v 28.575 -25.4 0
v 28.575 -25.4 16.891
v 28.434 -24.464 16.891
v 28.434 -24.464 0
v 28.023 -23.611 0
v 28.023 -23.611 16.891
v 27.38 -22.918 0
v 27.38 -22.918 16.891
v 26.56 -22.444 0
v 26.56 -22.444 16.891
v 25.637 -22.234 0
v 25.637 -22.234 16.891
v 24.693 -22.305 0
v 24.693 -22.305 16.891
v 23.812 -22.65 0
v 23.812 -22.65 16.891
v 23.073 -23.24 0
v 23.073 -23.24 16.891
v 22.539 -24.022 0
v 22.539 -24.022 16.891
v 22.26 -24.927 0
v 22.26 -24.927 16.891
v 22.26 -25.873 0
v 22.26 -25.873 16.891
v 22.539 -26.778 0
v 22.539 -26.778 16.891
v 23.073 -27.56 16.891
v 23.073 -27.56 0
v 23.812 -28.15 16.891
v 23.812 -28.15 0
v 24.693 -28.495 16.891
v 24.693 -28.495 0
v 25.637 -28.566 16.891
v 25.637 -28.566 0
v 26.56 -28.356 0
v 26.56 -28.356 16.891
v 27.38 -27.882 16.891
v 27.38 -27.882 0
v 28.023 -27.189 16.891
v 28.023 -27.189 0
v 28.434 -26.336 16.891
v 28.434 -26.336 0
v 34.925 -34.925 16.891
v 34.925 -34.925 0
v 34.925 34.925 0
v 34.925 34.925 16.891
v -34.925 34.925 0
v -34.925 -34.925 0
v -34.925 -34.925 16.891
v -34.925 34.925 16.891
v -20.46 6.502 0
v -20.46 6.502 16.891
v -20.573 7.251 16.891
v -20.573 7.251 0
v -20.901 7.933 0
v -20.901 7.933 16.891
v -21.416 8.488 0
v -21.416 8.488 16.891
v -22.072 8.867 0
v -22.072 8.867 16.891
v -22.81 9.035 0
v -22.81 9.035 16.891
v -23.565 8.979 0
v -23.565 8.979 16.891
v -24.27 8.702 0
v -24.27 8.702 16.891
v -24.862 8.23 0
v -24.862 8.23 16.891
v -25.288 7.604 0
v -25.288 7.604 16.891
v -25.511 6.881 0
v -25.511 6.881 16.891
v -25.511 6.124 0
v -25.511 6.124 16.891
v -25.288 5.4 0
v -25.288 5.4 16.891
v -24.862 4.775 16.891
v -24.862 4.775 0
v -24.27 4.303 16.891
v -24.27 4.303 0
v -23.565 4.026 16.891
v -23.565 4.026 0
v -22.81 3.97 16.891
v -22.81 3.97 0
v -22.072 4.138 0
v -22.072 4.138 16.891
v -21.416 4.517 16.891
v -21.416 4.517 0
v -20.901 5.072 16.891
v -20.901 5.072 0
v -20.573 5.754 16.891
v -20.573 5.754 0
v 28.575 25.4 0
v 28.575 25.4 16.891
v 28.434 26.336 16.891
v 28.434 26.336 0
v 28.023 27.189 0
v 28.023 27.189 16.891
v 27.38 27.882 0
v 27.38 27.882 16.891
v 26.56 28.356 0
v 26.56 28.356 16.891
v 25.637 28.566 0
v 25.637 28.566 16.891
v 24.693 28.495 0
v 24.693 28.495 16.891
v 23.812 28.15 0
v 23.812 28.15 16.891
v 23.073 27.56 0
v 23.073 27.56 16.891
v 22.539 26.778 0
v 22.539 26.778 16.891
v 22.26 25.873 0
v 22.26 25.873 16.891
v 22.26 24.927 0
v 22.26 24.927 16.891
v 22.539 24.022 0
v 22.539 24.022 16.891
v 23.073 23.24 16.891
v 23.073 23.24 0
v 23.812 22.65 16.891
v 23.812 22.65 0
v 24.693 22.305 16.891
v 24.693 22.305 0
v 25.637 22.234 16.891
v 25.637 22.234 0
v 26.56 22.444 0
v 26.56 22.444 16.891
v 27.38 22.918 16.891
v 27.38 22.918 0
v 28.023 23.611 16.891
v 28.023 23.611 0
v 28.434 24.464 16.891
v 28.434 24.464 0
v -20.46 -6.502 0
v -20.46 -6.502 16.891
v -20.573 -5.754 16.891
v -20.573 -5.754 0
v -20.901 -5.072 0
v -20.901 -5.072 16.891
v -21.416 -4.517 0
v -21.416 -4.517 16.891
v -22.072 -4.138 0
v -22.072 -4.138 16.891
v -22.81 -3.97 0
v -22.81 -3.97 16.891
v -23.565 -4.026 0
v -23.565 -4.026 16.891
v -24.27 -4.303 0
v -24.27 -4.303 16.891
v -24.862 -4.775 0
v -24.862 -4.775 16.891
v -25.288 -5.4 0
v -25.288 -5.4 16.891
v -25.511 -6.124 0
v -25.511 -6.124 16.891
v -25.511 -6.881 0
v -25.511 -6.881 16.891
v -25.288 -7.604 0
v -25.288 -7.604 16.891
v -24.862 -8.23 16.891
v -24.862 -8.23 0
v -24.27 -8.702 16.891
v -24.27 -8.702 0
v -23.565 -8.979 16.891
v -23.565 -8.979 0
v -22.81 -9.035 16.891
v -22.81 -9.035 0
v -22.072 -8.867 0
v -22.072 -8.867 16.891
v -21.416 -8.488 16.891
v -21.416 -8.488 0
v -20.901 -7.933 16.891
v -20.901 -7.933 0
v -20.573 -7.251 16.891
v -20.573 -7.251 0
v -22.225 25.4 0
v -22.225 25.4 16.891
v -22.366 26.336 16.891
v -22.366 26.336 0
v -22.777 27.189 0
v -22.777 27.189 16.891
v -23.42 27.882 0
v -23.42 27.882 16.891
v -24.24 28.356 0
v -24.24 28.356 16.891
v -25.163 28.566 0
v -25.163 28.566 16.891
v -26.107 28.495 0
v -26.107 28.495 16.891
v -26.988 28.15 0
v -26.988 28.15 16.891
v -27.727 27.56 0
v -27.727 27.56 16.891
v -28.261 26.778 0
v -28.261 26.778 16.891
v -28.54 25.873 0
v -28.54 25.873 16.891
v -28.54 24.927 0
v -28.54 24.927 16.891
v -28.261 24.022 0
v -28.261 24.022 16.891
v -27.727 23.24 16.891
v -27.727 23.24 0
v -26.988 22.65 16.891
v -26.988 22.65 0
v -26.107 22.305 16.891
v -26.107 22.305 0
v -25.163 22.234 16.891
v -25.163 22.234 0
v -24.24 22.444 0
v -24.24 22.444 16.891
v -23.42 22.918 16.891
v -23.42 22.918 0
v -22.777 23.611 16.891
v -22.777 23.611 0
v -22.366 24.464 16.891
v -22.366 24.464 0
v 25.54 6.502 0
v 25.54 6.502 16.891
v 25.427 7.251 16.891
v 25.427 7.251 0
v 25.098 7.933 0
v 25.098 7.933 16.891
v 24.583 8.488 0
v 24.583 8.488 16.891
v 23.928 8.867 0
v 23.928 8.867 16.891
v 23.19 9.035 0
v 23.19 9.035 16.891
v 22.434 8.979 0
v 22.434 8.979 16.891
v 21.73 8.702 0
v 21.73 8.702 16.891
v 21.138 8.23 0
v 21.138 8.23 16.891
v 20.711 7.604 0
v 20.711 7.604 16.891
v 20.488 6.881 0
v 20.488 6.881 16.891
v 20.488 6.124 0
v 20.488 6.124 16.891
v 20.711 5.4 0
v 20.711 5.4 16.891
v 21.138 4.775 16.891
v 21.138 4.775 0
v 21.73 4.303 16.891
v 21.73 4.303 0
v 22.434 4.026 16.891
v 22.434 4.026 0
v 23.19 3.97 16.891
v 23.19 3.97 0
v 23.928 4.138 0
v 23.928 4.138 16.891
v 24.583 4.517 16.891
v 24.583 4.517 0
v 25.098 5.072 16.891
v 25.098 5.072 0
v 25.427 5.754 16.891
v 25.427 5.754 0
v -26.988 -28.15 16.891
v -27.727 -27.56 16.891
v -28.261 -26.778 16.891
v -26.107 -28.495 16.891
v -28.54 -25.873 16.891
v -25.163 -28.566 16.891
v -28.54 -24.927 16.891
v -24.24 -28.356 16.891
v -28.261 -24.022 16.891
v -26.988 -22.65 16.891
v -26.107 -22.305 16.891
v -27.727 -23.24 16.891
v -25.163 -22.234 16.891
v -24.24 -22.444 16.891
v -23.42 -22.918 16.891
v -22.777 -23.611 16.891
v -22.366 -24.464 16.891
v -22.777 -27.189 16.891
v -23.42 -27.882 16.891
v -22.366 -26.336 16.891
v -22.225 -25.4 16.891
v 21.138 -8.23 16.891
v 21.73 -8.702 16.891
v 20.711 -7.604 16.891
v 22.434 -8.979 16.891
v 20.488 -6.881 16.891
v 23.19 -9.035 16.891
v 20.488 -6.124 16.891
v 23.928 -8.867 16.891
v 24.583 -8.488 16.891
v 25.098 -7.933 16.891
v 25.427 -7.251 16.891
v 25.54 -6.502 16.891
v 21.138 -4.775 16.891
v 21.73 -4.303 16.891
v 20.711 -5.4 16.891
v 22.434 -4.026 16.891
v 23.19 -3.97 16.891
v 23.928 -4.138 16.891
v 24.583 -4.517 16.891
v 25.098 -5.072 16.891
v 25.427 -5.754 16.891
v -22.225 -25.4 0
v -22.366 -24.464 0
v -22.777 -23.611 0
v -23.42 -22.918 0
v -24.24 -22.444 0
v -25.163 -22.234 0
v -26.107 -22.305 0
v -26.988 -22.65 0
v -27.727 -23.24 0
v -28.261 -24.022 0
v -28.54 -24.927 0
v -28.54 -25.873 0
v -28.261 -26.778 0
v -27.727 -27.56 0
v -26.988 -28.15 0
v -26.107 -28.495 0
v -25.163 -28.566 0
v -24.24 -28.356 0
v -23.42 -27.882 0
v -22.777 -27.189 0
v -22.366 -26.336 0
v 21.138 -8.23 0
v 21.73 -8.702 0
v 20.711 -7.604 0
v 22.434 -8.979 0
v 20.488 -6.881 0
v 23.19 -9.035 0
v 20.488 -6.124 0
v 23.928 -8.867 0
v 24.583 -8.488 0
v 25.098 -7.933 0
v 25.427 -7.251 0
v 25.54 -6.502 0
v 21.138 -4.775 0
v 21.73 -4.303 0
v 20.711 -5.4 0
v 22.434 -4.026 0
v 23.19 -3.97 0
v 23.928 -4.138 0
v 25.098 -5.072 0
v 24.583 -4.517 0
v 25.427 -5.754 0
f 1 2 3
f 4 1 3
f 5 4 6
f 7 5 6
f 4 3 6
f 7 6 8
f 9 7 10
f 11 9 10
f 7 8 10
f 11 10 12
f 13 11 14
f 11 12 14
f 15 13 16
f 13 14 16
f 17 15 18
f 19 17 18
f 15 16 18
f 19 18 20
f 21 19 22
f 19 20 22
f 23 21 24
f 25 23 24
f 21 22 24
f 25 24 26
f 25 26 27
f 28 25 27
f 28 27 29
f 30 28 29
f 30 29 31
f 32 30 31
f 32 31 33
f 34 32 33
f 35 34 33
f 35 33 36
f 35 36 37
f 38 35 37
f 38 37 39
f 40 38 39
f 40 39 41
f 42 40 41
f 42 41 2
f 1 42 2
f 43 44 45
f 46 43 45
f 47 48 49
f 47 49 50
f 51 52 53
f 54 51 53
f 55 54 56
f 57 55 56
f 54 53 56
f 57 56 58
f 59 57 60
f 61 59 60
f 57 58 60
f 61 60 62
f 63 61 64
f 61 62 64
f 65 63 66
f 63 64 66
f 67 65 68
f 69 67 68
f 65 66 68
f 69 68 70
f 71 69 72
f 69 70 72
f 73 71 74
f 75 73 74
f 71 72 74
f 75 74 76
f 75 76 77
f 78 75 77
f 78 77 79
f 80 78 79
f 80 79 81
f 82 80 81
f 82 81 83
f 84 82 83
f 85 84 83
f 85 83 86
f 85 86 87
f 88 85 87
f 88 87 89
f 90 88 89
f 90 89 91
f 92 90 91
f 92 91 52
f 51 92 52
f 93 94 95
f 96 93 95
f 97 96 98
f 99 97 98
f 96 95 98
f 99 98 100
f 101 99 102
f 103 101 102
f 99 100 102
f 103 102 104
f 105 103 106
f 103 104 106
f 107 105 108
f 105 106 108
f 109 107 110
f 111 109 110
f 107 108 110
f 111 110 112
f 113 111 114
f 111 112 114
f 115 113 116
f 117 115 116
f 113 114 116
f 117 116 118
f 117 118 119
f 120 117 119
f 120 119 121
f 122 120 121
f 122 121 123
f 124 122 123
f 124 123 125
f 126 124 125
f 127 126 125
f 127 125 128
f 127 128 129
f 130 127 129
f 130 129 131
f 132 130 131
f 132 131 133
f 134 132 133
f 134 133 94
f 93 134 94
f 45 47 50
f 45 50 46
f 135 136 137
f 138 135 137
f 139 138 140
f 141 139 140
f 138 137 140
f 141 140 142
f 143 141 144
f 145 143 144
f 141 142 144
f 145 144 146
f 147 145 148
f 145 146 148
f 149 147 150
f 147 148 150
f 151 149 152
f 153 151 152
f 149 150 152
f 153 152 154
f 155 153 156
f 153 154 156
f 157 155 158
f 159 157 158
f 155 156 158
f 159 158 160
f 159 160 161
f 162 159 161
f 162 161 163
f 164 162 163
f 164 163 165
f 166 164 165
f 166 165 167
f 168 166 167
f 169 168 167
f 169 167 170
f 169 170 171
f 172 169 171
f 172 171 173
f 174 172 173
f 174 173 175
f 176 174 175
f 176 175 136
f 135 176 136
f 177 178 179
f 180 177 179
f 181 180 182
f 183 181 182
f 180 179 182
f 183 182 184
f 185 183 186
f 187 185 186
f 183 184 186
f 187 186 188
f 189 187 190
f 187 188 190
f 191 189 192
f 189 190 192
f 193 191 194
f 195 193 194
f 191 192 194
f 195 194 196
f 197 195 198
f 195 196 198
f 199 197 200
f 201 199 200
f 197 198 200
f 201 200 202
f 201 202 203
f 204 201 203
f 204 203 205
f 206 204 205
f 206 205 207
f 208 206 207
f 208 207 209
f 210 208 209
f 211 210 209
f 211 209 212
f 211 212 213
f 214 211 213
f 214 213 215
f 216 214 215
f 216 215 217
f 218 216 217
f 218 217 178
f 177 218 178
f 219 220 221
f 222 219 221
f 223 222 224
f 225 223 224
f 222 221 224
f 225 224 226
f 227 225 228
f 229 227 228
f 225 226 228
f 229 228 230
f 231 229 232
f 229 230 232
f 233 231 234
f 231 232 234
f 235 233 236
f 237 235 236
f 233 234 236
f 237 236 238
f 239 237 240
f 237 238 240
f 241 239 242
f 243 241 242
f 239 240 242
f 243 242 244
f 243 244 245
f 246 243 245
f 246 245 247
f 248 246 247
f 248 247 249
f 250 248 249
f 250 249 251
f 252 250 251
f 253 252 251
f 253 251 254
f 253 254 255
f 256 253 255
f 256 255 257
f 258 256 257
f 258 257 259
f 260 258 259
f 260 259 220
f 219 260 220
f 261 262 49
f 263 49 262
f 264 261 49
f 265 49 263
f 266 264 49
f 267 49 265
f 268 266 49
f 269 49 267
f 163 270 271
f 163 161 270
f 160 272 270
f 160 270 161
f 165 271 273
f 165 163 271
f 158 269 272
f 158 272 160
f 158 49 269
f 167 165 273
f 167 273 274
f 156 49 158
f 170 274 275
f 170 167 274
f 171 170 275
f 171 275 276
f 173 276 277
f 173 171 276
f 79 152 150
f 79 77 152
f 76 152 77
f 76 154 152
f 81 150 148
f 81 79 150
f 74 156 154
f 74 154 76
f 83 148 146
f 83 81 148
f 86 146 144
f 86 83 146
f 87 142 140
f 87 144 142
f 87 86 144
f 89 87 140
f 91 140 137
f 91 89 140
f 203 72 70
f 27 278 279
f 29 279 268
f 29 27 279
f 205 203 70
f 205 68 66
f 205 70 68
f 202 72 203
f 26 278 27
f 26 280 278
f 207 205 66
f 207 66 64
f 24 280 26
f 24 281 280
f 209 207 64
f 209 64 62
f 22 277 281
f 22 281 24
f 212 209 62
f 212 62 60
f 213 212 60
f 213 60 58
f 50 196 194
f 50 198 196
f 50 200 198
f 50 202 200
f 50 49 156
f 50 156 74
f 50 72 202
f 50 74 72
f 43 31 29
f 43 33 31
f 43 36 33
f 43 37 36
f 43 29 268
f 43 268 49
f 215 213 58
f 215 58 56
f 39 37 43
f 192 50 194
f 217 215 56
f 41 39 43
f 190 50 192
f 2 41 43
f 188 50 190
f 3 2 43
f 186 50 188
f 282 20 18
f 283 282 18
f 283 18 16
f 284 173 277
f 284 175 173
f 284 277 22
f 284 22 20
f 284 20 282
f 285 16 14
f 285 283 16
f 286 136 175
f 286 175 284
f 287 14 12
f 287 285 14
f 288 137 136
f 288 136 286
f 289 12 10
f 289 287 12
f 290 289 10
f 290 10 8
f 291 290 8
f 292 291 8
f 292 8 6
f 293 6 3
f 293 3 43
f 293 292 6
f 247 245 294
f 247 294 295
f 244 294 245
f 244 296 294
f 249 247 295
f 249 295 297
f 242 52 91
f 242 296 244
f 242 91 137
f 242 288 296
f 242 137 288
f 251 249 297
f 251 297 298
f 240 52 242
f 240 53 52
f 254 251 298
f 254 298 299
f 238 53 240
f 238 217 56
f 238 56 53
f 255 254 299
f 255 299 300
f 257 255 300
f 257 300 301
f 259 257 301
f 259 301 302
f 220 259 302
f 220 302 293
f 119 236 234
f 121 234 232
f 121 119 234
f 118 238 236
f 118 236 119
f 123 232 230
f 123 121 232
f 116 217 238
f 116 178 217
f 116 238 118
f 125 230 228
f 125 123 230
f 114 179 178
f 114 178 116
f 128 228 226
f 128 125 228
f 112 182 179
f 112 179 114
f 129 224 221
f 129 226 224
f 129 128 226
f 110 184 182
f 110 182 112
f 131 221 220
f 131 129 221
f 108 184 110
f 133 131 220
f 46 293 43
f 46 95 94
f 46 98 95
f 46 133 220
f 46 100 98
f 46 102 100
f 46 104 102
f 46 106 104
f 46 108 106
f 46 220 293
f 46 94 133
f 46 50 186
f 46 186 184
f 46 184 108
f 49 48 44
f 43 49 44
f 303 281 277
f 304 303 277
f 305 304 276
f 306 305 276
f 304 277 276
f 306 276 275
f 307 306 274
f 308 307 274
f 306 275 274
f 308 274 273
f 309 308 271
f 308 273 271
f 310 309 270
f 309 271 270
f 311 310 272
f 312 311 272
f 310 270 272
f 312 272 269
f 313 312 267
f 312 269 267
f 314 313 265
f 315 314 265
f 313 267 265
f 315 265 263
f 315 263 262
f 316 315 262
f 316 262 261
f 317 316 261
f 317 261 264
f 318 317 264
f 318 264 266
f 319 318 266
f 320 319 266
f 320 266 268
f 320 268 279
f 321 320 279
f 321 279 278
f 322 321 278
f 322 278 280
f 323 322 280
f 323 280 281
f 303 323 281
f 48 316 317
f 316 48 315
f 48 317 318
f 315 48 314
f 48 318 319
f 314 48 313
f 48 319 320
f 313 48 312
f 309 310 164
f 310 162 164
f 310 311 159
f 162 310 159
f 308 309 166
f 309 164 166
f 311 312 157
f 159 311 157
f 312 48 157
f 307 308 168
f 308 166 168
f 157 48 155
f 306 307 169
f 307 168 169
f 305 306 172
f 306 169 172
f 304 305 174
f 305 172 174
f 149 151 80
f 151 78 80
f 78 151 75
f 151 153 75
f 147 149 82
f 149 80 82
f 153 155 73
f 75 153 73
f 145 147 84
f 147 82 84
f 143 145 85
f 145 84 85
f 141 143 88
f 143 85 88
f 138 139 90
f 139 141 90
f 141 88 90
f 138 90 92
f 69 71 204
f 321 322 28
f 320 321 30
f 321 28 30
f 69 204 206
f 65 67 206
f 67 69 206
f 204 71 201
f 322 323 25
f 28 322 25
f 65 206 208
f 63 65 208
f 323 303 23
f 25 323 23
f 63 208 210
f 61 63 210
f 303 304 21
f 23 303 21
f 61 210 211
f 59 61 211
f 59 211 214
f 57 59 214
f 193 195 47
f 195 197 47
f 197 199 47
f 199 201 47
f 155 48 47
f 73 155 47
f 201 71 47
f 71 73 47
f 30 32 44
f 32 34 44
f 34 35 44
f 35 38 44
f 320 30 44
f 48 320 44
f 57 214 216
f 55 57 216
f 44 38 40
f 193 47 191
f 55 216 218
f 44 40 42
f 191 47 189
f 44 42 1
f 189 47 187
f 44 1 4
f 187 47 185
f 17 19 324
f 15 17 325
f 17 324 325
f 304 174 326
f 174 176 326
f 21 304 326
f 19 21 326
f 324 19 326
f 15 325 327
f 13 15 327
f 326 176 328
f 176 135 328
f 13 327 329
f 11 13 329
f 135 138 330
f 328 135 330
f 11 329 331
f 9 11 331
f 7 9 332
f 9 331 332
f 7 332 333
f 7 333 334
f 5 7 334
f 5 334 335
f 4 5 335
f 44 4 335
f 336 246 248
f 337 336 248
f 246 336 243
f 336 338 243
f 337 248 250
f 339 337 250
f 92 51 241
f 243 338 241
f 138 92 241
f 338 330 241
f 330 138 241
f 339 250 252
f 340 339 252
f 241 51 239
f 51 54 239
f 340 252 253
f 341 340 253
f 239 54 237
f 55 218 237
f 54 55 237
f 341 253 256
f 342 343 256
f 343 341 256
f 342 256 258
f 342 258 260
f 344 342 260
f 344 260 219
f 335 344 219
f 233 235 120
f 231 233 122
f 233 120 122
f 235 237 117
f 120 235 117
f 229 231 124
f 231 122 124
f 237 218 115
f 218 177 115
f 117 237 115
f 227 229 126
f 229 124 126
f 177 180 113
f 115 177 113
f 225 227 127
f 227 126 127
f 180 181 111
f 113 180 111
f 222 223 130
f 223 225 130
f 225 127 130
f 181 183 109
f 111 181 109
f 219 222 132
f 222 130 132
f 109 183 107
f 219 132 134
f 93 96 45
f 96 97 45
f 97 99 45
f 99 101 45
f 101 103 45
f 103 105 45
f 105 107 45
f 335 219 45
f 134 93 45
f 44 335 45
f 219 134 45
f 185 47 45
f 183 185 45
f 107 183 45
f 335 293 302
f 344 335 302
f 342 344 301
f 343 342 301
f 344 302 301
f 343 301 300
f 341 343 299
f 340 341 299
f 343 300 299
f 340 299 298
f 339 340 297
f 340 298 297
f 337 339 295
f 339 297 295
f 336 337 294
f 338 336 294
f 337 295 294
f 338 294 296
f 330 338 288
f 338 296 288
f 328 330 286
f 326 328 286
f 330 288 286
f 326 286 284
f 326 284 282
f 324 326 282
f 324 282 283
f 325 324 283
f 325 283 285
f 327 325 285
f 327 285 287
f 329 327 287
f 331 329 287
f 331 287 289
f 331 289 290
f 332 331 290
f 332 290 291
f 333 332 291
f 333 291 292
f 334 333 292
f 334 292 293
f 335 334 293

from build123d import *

# Parameters (mm, degrees)
F0_W     = 69.85
F0_H     = 69.85
F1_DEPTH = 16.891
F2_R     = 2.54
F3_DEPTH = 16.892
F4_R     = 3.175
F5_DEPTH = 16.892


with BuildPart() as f1:
    # F0 (on Top) → F1 (new body)
    with BuildSketch(Plane.XY):
        Rectangle(F0_W, F0_H)
    extrude(amount=F1_DEPTH)

    # F2 (on face) → F3 (cut, through all)
    with BuildSketch(Plane.XY.offset(16.891)):
        with Locations((-22.9997, 6.5024)):
            Circle(F2_R)
        with Locations((22.9997, 6.5024)):
            Circle(F2_R)
        with Locations((22.9997, -6.5024)):
            Circle(F2_R)
        with Locations((-22.9997, -6.5024)):
            Circle(F2_R)
    extrude(amount=-F3_DEPTH, mode=Mode.SUBTRACT)

    # F4 (on face) → F5 (cut, through all)
    with BuildSketch(Plane.XY.offset(16.891)):
        with Locations((-25.4, 25.4)):
            Circle(F4_R)
        with Locations((25.4, 25.4)):
            Circle(F4_R)
        with Locations((-25.4, -25.4)):
            Circle(F4_R)
        with Locations((25.4, -25.4)):
            Circle(F4_R)
    extrude(amount=-F5_DEPTH, mode=Mode.SUBTRACT)


solid = f1.part
